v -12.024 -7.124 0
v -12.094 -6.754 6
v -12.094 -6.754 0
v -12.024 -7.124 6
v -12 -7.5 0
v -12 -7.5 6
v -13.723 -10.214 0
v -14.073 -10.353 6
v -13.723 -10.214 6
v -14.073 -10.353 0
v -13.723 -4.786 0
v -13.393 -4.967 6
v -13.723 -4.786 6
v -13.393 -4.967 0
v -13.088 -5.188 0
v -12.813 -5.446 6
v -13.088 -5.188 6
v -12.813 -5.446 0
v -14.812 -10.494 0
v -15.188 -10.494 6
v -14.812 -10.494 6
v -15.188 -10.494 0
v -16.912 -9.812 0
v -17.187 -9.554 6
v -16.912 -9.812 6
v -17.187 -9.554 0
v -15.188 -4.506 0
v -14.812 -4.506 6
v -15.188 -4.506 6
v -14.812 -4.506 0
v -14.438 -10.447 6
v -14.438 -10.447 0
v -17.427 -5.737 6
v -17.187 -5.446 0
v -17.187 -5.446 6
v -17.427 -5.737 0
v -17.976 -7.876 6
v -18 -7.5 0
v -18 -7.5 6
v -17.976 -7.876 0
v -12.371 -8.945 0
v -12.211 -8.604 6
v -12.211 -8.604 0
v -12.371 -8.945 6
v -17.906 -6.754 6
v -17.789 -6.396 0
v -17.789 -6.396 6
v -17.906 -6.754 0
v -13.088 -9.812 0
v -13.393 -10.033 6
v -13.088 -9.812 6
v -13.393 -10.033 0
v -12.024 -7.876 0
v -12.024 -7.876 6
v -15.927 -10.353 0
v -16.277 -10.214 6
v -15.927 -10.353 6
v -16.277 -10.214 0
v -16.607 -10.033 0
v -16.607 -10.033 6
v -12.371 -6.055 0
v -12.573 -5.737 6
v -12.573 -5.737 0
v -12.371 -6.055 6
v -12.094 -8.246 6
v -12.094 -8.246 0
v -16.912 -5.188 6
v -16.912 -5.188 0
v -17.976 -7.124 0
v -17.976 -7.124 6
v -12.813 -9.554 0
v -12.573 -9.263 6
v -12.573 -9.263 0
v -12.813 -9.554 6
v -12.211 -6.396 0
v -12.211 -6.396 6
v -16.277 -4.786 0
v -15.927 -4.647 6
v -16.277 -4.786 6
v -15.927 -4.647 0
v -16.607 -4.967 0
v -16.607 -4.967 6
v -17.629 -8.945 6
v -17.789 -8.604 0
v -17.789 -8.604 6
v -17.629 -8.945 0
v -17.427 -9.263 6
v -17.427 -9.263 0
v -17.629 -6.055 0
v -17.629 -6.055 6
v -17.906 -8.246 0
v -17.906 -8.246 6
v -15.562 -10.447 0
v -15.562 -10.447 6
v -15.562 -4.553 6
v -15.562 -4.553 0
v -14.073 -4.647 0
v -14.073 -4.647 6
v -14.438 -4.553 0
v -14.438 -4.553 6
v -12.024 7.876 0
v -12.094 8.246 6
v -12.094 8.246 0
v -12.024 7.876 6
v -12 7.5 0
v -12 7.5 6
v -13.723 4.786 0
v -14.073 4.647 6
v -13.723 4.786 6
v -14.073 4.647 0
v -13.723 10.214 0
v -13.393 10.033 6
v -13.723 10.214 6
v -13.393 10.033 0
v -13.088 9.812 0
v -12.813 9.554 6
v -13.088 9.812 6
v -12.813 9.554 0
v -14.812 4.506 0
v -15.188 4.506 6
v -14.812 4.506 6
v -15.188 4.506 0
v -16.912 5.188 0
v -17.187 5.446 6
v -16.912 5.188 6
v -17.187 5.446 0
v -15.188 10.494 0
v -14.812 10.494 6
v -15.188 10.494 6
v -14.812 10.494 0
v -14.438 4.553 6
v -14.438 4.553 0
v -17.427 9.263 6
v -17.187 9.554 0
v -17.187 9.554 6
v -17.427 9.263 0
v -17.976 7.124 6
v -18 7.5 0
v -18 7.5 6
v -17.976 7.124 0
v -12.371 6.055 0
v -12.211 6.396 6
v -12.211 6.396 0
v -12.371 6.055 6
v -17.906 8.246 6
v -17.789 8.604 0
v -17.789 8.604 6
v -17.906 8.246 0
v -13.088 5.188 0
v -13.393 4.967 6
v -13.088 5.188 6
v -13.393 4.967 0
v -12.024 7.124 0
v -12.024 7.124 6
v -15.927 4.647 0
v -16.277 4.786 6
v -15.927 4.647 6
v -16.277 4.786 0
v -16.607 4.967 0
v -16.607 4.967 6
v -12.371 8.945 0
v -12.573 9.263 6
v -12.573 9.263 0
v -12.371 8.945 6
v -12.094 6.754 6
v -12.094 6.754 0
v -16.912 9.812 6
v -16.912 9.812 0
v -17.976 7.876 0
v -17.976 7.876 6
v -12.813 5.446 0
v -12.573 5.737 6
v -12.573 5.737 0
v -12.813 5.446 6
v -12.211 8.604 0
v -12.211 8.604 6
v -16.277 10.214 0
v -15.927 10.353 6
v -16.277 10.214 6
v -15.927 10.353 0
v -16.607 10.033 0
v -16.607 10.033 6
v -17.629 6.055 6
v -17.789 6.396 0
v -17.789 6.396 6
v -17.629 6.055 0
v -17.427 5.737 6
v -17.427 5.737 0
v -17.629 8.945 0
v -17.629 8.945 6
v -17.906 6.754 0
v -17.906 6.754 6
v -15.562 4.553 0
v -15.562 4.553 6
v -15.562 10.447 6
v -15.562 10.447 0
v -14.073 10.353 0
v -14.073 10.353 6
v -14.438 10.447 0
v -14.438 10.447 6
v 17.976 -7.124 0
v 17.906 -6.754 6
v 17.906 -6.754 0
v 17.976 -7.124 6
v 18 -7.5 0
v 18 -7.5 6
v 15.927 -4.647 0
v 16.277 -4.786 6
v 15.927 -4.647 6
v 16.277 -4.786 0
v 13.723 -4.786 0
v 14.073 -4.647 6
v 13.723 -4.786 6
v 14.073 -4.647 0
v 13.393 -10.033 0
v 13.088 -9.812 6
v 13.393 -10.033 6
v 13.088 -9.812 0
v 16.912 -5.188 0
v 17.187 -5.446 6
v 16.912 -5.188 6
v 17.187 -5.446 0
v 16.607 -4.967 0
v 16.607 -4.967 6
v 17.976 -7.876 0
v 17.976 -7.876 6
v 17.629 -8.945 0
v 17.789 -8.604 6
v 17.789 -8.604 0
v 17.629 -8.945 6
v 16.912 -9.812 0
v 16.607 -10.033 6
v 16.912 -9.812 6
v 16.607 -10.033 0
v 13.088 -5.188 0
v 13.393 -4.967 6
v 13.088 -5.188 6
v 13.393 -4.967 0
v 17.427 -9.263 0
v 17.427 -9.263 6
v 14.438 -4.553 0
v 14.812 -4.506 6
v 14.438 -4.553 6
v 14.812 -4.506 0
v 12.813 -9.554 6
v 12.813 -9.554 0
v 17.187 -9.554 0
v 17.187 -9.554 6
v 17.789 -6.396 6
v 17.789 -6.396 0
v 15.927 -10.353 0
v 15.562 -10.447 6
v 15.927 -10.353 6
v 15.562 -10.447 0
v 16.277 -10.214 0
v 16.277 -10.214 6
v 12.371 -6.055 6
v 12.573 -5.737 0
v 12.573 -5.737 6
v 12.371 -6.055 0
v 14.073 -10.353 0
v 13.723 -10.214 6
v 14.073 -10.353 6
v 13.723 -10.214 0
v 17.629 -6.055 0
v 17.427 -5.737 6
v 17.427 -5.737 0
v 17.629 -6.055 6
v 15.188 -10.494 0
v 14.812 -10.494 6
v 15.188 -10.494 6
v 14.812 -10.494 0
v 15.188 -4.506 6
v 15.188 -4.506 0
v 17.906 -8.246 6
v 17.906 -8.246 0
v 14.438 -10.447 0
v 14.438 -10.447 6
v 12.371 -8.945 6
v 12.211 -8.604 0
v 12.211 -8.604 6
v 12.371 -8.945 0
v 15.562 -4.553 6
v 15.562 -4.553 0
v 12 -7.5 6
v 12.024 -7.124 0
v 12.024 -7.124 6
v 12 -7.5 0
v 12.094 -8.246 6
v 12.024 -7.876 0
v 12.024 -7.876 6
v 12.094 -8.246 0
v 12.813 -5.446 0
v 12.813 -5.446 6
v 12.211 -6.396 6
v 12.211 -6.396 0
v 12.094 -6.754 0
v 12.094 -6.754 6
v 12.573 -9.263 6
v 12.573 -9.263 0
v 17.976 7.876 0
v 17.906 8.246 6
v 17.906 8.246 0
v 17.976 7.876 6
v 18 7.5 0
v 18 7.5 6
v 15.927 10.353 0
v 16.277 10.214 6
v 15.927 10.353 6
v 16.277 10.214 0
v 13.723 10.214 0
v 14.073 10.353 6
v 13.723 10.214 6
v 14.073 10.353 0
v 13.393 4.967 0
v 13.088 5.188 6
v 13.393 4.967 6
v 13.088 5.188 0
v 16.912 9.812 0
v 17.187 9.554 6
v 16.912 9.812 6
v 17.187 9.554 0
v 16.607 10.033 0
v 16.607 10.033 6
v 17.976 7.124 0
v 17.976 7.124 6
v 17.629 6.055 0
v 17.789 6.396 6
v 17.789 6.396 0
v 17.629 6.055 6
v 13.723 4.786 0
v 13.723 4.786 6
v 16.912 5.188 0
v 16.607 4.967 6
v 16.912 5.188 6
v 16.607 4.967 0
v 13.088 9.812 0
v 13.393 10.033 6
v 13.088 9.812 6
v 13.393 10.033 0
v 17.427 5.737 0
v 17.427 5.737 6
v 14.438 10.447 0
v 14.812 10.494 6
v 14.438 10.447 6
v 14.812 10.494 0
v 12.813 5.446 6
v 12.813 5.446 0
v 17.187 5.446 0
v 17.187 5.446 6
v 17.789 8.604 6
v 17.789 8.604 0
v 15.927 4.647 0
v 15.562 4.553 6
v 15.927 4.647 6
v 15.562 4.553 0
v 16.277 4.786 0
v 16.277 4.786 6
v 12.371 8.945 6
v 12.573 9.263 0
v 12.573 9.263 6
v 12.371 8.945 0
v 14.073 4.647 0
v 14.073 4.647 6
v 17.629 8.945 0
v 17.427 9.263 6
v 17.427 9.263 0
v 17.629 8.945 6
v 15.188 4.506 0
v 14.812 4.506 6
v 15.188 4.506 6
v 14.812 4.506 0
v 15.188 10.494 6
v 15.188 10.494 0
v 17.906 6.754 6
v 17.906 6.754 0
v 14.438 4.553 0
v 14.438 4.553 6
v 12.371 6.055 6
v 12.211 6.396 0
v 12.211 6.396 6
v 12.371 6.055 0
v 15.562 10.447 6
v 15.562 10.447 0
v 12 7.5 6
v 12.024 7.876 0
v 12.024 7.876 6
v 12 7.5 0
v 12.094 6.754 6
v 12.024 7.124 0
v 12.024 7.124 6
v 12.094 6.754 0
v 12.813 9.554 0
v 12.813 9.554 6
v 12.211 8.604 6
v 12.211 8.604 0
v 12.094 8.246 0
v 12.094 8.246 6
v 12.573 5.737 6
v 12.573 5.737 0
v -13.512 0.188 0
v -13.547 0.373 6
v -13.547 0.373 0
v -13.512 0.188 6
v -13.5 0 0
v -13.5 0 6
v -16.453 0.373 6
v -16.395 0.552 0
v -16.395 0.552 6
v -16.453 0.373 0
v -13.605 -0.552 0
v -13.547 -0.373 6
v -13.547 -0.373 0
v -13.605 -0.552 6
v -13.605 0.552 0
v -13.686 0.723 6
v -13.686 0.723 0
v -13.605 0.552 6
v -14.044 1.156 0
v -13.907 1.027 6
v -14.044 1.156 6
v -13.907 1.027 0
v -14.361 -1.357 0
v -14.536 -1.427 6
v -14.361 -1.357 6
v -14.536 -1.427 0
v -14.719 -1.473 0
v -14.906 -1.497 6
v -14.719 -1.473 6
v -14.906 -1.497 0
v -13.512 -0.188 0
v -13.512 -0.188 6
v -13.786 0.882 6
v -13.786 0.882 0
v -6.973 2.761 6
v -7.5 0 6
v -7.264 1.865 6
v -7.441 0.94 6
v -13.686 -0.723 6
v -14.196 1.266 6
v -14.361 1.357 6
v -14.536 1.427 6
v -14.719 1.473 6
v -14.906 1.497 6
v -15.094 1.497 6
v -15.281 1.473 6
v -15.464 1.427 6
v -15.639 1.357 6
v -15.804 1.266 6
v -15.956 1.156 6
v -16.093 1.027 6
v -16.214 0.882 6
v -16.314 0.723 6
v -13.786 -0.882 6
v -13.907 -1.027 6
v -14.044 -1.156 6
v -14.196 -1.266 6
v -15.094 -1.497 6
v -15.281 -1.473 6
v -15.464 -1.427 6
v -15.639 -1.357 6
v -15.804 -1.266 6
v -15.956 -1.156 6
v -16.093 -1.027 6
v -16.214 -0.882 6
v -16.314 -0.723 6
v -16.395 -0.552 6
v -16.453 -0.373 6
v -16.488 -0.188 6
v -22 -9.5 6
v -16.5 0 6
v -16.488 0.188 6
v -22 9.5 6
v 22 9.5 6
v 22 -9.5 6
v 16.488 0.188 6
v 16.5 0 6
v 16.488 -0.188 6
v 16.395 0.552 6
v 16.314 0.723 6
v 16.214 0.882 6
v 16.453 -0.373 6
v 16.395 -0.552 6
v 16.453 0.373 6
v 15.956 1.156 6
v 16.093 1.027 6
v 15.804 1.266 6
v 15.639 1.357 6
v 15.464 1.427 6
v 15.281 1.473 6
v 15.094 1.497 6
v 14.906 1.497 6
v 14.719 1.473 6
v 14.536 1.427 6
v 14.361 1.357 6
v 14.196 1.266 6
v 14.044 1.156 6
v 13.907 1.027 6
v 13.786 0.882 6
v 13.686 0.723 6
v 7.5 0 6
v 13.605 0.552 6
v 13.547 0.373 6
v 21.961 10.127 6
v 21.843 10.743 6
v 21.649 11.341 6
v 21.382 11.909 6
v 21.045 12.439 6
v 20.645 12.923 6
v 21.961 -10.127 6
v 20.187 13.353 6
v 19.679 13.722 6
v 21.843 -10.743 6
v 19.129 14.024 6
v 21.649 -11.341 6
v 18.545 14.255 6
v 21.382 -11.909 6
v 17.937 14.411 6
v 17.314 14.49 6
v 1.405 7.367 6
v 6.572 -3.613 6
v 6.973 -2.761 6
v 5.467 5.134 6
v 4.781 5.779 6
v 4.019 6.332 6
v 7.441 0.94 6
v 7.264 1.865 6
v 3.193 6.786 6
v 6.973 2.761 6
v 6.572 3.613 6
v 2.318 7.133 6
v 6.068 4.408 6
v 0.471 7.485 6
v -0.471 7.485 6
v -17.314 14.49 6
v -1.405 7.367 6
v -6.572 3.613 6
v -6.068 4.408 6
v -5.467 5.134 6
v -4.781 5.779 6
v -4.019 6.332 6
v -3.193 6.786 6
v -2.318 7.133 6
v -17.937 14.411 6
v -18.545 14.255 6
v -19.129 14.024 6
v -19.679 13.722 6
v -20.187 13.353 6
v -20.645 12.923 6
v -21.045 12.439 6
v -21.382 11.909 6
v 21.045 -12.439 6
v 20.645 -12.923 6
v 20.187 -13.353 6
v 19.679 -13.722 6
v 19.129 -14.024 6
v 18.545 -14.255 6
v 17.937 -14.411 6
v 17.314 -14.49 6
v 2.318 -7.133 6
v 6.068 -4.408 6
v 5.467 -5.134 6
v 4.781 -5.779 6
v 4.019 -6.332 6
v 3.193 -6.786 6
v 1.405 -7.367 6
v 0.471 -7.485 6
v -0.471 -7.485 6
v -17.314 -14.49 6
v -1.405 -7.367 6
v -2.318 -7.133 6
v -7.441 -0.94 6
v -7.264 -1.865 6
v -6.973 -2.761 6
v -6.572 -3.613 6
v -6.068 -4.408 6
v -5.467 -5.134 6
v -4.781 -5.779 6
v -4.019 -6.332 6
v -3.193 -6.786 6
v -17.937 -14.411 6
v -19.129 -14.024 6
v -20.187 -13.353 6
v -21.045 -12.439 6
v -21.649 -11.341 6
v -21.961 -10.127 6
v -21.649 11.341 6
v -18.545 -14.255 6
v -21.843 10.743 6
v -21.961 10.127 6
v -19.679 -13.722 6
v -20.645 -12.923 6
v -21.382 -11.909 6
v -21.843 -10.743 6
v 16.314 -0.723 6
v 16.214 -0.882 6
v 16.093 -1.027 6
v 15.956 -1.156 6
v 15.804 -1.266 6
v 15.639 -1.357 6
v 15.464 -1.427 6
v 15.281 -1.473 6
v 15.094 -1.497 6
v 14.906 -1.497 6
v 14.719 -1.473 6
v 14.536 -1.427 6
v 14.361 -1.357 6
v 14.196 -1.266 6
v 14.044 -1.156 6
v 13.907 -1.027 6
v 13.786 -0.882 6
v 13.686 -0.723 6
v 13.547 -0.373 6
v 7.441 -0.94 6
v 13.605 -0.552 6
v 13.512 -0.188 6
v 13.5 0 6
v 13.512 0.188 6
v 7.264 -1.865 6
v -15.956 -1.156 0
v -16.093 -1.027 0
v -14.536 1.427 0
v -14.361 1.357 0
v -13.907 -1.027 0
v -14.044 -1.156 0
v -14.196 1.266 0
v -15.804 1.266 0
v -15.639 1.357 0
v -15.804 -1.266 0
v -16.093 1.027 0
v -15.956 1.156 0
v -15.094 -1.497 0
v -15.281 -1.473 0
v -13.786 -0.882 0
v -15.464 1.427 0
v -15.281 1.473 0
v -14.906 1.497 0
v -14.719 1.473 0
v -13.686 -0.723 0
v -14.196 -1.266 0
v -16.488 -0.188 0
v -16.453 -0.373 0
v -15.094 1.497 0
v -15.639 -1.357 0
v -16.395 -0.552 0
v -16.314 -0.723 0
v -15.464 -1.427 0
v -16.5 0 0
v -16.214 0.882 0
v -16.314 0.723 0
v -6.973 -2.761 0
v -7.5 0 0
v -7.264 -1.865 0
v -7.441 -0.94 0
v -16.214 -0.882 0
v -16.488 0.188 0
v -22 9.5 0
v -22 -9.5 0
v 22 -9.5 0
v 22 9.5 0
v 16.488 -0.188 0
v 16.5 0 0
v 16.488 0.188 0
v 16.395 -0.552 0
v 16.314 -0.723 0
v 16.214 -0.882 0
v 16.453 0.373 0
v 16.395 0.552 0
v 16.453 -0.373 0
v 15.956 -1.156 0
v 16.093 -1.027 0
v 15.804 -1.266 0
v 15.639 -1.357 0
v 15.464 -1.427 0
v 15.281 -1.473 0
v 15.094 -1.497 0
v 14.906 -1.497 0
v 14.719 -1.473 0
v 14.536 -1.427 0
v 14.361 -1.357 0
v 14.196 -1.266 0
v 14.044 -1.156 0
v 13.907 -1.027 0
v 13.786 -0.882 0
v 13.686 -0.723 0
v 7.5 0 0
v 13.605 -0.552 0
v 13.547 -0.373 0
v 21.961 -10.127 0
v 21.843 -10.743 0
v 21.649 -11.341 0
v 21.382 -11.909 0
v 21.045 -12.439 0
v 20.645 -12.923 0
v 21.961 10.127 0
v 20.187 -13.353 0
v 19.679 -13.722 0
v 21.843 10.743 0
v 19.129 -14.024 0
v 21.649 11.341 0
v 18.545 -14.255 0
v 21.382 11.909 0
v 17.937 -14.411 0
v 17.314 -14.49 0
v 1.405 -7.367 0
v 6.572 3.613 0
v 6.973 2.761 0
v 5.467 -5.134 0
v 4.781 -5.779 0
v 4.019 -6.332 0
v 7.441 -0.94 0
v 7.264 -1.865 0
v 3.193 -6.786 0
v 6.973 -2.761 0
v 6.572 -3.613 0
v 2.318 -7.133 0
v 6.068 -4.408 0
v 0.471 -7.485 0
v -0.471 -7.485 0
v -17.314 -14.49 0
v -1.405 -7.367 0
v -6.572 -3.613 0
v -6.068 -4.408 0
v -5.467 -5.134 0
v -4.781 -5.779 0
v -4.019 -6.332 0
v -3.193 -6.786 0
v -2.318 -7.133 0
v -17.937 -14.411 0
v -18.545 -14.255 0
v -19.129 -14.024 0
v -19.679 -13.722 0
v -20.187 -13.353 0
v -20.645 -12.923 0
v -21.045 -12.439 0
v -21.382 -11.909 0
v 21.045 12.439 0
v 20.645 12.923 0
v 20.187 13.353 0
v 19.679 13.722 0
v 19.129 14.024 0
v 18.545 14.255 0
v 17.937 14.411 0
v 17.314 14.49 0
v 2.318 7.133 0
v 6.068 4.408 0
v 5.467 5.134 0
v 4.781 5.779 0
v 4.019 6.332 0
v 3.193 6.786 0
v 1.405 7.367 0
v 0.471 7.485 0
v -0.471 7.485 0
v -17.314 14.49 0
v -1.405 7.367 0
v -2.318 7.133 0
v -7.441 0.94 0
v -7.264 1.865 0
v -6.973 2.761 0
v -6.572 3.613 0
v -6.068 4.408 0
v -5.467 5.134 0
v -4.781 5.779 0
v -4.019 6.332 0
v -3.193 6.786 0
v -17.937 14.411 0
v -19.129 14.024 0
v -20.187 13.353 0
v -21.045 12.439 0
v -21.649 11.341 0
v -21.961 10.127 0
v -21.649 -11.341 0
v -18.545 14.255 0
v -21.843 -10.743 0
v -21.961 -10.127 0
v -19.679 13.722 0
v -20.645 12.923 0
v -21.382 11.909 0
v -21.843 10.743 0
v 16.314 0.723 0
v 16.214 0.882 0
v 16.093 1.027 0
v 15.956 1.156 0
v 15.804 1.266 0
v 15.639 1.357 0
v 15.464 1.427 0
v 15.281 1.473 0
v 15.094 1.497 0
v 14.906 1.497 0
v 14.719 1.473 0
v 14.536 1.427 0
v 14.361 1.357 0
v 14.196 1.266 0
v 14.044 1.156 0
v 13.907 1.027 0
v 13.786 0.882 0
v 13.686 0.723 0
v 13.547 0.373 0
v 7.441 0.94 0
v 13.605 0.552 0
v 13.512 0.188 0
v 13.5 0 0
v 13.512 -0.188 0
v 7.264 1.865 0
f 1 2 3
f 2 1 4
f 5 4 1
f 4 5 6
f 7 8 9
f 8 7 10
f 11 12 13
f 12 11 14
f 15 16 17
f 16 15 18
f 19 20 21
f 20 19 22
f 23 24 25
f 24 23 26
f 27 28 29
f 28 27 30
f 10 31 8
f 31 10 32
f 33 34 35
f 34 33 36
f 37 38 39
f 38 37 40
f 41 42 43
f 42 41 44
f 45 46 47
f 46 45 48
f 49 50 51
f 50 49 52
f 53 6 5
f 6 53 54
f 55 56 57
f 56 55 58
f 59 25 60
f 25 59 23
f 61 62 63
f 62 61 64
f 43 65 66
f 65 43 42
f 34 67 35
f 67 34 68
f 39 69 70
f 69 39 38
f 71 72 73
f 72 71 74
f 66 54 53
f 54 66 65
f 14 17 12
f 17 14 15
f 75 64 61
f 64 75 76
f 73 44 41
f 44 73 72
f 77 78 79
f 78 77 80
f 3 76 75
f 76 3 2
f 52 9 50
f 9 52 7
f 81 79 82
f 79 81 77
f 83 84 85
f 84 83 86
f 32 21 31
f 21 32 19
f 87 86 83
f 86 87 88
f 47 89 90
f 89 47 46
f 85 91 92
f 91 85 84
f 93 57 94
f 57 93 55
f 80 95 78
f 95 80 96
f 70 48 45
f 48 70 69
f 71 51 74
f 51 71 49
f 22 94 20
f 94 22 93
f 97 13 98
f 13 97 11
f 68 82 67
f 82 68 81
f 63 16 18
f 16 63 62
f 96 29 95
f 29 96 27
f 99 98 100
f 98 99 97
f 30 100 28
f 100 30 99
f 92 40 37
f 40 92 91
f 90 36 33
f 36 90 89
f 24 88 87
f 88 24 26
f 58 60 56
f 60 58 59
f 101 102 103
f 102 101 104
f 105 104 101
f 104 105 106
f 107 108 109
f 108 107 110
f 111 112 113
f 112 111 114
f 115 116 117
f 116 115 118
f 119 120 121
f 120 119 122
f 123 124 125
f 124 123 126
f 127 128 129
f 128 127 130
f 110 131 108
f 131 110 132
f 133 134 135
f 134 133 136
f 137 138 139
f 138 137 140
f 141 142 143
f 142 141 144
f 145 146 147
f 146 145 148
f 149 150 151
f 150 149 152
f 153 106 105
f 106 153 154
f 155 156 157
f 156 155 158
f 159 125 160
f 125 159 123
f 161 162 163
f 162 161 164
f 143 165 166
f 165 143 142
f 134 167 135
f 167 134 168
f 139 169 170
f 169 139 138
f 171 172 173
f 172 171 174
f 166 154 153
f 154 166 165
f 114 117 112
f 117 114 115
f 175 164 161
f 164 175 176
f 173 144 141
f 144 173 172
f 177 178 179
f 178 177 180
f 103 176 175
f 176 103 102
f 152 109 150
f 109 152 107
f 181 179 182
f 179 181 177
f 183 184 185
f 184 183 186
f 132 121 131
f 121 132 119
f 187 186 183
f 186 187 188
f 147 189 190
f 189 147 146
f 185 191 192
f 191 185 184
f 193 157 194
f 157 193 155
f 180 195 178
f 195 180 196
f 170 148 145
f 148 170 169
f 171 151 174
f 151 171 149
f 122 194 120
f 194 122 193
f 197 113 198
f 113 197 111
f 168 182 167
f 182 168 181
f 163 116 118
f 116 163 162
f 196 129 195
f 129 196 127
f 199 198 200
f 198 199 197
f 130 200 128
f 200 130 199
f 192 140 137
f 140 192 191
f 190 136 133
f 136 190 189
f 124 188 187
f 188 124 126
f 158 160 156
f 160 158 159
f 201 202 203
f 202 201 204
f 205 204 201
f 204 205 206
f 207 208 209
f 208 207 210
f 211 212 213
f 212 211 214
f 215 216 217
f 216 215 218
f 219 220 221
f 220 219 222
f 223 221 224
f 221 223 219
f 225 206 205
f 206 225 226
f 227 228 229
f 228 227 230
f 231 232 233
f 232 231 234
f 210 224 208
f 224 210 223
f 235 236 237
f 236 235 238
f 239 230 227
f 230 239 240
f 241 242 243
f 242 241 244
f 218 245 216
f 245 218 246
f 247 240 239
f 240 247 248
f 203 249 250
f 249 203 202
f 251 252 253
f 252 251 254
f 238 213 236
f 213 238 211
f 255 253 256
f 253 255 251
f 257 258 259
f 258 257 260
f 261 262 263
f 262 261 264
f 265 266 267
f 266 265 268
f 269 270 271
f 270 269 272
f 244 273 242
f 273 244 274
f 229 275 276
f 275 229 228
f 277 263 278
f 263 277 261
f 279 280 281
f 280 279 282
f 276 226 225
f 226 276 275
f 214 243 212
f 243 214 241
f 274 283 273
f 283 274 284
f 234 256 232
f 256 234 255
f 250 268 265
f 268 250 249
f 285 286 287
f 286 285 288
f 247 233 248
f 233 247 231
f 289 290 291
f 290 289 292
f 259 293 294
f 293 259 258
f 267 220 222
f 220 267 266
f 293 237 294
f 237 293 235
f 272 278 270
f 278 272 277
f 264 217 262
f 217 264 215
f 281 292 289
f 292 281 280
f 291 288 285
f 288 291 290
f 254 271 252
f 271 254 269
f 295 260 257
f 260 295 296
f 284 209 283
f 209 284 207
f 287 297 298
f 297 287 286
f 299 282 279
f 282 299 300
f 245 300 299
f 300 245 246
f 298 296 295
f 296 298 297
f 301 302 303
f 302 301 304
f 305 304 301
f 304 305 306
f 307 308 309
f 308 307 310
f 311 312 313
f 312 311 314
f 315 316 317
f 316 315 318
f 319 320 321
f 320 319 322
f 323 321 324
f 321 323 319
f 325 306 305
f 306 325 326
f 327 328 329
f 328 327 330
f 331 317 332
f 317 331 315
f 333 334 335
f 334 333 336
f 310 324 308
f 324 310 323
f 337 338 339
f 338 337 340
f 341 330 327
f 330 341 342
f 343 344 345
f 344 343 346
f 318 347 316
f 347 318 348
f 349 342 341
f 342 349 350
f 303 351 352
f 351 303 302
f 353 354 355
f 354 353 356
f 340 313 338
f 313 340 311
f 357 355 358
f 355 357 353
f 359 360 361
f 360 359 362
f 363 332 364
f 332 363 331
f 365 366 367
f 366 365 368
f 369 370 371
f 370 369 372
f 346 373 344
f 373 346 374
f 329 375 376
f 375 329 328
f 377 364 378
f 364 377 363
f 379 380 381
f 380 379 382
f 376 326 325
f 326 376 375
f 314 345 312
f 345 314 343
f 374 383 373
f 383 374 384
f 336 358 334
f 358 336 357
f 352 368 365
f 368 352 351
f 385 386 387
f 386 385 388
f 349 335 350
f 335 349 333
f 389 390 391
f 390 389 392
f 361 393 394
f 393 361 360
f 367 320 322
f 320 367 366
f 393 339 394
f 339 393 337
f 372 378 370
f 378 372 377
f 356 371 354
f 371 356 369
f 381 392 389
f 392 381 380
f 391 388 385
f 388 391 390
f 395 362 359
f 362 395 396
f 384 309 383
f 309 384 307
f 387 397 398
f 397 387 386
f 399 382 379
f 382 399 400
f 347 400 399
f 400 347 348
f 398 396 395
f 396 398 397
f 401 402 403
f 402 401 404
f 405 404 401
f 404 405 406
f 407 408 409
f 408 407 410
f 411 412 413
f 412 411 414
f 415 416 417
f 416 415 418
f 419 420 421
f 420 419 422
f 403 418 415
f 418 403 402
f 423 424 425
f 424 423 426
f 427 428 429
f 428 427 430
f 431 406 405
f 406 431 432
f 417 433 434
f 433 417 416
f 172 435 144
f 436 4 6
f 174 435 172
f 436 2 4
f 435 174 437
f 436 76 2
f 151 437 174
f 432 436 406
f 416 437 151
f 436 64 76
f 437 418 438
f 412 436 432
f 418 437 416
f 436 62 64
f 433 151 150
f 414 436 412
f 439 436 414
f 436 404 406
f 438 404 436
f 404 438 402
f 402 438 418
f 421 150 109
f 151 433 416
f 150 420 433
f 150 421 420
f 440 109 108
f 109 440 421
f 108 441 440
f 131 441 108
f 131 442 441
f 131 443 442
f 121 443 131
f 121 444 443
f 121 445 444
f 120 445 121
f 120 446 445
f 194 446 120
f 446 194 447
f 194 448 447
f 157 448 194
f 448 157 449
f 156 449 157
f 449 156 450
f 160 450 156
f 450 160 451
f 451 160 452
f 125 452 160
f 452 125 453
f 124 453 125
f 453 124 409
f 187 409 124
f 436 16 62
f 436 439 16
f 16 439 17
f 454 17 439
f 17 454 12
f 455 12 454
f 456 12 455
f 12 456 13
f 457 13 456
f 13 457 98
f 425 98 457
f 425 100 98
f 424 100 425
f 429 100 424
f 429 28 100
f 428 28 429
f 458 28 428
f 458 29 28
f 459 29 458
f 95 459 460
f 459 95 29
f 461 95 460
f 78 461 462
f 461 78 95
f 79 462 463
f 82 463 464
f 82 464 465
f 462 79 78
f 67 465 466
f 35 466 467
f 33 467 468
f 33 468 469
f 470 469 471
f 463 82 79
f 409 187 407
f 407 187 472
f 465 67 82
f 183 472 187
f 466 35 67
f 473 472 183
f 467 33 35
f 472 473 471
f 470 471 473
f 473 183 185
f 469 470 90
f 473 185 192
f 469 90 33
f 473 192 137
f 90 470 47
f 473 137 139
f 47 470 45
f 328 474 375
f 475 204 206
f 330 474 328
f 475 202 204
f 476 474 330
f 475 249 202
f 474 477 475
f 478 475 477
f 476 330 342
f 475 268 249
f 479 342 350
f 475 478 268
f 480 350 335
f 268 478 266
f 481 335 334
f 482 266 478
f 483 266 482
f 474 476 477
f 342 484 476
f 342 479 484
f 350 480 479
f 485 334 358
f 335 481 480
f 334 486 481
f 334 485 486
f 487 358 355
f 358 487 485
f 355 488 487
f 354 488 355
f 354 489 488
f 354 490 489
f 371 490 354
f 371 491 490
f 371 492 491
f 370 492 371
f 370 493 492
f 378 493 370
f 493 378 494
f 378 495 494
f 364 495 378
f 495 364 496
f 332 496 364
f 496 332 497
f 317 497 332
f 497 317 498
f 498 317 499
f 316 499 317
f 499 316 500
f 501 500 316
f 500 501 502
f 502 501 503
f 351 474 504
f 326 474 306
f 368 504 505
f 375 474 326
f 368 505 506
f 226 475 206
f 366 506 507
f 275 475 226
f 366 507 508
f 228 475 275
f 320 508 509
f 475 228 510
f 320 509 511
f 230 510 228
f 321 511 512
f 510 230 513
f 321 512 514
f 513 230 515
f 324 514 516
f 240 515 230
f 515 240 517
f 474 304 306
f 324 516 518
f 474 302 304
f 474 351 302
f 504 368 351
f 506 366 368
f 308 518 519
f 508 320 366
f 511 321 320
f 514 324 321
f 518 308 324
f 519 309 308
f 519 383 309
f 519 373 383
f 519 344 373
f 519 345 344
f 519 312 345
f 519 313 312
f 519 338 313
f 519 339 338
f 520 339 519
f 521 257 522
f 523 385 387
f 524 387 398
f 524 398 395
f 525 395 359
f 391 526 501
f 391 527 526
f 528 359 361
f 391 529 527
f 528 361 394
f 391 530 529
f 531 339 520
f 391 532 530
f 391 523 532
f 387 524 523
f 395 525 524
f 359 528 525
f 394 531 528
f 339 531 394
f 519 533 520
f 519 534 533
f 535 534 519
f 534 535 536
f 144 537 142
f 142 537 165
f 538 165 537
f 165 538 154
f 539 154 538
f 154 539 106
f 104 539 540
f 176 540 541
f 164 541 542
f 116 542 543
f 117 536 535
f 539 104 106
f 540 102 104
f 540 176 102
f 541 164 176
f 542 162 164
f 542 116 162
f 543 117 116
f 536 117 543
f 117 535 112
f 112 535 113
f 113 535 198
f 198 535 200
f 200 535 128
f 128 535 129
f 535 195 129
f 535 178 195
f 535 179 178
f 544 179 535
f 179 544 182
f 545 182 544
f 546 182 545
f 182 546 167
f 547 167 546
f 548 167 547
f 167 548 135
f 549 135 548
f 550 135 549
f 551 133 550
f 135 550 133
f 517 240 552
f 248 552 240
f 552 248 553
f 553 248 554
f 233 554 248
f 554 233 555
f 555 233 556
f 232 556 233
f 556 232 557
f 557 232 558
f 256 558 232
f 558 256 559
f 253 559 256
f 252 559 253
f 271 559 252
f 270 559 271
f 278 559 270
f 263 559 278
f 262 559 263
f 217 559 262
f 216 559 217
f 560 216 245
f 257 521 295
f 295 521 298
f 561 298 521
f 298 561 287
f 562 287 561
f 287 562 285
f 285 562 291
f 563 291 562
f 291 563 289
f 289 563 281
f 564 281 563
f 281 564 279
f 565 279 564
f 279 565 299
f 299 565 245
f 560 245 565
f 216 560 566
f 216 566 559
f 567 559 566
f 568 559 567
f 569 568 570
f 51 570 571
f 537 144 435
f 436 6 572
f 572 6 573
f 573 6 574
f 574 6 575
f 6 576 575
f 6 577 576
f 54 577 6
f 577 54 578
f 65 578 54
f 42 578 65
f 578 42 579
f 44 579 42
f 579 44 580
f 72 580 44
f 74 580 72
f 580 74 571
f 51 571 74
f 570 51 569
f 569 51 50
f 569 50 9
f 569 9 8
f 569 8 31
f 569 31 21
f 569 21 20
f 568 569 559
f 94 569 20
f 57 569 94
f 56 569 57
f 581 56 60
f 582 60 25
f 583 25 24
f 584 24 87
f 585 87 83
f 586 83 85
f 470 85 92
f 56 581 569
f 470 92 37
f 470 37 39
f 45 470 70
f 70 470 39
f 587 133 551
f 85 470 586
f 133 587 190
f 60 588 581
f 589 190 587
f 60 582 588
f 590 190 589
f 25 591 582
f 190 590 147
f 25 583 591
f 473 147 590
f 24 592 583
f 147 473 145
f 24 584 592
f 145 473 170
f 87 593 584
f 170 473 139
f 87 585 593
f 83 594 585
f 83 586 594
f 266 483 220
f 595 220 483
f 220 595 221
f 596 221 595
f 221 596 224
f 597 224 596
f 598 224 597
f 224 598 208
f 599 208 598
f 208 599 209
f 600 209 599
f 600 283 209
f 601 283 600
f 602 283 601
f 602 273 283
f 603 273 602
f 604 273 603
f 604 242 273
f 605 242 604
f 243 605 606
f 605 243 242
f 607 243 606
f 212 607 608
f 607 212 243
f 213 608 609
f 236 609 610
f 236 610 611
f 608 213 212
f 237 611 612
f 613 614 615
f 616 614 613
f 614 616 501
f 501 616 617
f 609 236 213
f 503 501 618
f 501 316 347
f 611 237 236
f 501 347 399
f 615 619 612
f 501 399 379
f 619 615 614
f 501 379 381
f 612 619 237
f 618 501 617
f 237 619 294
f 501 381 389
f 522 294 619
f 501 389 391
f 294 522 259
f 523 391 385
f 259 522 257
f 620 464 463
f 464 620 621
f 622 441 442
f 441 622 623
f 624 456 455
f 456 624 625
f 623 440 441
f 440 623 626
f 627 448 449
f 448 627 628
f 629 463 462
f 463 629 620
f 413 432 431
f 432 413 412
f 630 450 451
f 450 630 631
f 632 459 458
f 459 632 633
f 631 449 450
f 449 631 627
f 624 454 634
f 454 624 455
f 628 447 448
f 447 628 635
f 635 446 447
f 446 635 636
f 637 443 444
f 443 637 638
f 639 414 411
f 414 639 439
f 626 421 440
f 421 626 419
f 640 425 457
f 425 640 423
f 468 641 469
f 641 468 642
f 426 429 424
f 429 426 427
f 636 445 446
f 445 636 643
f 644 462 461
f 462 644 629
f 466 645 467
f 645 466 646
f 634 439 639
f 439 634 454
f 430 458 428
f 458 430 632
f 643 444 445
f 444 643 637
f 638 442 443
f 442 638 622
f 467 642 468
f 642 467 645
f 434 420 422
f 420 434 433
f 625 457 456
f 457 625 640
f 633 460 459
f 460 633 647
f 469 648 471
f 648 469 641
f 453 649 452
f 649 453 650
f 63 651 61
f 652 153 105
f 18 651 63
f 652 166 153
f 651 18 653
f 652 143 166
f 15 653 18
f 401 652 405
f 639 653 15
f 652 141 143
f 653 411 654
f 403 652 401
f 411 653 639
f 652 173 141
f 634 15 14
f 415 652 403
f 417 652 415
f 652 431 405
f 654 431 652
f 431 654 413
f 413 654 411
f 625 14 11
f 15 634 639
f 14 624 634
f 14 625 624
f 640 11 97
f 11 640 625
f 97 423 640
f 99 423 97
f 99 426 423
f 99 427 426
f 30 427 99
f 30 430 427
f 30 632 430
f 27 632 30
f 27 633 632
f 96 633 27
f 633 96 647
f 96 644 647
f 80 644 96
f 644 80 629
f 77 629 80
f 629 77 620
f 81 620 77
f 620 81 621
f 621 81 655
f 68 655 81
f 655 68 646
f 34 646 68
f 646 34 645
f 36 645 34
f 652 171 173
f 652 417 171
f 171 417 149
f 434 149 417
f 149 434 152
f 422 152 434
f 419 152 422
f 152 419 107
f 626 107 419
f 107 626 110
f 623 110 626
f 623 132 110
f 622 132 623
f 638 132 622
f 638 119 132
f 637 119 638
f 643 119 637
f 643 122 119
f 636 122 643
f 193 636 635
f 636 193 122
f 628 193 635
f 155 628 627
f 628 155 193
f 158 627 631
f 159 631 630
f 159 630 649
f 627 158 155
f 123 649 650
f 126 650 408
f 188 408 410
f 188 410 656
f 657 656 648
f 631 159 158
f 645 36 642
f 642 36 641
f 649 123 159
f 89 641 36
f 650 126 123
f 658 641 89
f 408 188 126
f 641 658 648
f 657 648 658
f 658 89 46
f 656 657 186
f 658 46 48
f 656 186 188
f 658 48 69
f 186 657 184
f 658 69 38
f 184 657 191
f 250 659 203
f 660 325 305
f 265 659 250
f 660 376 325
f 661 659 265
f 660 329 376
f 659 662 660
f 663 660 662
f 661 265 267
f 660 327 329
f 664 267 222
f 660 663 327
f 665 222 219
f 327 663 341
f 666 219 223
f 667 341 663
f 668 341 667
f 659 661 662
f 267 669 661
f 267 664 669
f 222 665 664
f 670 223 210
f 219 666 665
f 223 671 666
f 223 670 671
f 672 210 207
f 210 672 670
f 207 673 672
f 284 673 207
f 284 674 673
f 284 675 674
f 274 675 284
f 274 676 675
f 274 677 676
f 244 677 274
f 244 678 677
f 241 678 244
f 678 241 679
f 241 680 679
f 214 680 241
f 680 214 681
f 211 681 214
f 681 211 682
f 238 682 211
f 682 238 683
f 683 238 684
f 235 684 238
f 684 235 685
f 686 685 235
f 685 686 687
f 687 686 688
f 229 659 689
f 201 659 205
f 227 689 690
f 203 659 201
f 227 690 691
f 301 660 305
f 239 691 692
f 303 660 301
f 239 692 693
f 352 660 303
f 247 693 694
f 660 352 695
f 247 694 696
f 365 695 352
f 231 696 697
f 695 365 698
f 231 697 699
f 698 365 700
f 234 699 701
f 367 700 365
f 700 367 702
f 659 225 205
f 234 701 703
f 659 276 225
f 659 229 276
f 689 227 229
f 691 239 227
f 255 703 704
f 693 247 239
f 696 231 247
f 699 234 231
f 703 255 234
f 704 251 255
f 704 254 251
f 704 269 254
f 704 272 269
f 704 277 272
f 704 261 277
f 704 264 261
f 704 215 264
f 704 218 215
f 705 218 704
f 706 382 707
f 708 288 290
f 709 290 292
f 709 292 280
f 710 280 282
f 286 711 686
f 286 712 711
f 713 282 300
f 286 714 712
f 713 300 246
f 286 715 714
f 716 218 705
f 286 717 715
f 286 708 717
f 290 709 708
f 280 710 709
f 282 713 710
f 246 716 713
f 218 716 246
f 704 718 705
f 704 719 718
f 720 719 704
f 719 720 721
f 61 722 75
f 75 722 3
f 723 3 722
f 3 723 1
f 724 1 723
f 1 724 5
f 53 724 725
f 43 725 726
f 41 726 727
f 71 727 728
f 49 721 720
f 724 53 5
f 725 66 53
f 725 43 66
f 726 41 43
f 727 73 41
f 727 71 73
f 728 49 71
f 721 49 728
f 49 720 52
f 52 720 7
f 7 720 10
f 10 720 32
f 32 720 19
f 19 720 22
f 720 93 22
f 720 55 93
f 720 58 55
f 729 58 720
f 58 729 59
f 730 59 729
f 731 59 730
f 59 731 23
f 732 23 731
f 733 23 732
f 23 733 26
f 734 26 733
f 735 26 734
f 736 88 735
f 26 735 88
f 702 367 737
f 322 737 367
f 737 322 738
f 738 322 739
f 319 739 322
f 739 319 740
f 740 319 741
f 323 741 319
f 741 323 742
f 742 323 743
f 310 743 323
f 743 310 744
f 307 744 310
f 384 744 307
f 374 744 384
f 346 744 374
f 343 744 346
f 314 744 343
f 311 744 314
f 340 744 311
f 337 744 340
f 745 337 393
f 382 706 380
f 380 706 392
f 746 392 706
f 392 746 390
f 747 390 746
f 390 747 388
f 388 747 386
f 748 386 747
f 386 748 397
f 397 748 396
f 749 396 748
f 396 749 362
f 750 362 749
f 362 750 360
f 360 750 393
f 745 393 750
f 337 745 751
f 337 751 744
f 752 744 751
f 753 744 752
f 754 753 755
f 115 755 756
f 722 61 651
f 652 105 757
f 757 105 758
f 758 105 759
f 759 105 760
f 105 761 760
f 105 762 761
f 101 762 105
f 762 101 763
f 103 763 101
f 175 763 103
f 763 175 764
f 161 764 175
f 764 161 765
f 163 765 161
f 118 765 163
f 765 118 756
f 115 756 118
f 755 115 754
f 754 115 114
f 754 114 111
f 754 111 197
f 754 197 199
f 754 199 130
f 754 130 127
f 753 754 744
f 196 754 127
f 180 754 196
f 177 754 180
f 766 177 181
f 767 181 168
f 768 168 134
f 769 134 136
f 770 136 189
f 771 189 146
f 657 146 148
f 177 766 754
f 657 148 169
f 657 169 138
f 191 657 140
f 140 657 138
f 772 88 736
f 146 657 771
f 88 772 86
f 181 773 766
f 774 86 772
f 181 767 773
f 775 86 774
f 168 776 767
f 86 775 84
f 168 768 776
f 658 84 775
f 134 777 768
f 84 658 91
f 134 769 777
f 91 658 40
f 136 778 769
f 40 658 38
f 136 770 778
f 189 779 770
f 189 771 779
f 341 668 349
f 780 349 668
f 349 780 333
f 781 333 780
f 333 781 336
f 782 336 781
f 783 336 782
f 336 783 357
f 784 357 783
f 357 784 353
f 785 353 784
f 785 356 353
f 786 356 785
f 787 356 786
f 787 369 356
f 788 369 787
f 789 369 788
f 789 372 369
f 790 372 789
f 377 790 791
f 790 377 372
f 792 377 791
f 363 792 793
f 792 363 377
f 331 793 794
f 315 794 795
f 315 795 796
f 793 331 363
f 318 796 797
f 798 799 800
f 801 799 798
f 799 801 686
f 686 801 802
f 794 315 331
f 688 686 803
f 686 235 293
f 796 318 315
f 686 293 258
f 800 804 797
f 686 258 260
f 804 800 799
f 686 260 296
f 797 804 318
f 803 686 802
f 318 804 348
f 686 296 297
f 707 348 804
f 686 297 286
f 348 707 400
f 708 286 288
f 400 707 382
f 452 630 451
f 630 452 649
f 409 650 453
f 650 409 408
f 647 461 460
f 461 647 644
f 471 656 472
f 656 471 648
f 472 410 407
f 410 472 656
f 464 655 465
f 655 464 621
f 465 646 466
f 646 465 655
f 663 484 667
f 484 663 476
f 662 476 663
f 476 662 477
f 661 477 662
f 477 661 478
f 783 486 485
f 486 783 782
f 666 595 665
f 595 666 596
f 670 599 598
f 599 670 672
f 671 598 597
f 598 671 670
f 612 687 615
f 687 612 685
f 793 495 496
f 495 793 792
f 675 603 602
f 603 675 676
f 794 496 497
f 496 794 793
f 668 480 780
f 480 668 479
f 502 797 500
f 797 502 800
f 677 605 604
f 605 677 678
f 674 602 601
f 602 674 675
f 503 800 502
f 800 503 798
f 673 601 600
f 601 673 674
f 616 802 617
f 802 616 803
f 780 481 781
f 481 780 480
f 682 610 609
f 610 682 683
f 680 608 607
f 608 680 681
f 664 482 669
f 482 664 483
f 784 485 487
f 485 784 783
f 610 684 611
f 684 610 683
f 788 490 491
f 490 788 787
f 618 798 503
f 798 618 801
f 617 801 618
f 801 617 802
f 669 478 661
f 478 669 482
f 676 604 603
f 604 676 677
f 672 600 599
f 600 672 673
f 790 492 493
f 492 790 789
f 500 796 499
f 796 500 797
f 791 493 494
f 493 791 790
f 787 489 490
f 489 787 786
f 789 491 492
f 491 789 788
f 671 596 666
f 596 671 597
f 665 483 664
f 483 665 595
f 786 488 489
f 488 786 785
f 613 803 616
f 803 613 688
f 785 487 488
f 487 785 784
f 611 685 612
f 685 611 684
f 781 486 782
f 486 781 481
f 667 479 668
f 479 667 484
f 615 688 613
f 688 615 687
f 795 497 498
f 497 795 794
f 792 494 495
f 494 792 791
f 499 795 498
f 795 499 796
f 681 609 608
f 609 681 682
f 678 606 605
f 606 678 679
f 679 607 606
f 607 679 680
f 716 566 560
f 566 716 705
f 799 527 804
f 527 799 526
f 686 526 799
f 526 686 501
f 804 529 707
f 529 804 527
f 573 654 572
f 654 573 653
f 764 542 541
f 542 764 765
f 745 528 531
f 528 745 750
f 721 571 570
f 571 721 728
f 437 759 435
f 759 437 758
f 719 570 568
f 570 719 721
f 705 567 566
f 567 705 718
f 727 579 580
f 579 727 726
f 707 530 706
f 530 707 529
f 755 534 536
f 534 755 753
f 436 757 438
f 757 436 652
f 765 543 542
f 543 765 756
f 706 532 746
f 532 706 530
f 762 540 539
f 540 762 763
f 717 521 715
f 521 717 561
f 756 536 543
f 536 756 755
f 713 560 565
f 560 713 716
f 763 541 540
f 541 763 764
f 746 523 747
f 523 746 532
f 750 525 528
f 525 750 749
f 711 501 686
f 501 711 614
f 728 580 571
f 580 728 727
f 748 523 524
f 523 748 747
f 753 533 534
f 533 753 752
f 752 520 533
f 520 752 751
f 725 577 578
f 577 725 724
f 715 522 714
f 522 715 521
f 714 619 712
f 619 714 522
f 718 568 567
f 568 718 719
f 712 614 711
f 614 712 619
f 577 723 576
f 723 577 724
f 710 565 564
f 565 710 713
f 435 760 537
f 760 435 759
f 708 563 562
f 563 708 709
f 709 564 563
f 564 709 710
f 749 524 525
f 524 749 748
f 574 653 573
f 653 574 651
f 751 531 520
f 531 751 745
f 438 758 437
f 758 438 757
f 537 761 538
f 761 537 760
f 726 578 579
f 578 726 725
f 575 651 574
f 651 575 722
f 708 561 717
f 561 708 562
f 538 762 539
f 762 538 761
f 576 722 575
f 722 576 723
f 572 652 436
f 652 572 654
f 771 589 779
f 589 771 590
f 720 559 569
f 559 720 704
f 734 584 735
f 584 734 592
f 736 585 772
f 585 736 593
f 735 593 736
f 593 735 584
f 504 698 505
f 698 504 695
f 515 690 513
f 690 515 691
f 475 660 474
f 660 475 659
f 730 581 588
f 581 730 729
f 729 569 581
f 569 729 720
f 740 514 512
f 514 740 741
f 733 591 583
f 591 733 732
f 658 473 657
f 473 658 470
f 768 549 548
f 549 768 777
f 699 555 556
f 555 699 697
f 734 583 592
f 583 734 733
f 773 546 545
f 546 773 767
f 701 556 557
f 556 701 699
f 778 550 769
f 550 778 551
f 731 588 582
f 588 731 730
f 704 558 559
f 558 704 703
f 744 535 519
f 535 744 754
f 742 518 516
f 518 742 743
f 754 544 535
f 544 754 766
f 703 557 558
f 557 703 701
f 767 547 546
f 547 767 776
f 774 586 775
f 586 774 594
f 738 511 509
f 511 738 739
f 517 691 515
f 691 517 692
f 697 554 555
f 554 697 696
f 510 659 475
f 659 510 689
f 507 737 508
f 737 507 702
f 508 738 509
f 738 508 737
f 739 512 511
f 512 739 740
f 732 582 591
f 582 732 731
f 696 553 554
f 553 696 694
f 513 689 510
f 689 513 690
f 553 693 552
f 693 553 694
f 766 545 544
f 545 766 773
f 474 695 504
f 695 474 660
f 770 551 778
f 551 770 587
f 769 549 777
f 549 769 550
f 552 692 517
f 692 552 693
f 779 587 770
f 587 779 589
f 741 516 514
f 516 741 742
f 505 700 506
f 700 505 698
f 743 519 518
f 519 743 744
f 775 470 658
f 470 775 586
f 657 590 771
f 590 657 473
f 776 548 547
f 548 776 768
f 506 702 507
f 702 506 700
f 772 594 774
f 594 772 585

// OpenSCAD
$fn = 50;


difference() {
	union() {
		hull() {
			translate(v = [-17.0000000000, 9.5000000000, 0]) {
				cylinder(h = 6, r = 5);
			}
			translate(v = [17.0000000000, 9.5000000000, 0]) {
				cylinder(h = 6, r = 5);
			}
			translate(v = [-17.0000000000, -9.5000000000, 0]) {
				cylinder(h = 6, r = 5);
			}
			translate(v = [17.0000000000, -9.5000000000, 0]) {
				cylinder(h = 6, r = 5);
			}
		}
	}
	union() {
		#translate(v = [-15.0000000000, -7.5000000000, 0]) {
			cylinder(h = 6, r = 3.0000000000);
		}
		#translate(v = [-15.0000000000, 7.5000000000, 0]) {
			cylinder(h = 6, r = 3.0000000000);
		}
		#translate(v = [15.0000000000, -7.5000000000, 0]) {
			cylinder(h = 6, r = 3.0000000000);
		}
		#translate(v = [15.0000000000, 7.5000000000, 0]) {
			cylinder(h = 6, r = 3.0000000000);
		}
		#translate(v = [-15.0000000000, -7.5000000000, -100.0000000000]) {
			cylinder(h = 200, r = 3.0000000000);
		}
		#translate(v = [-15.0000000000, 7.5000000000, -100.0000000000]) {
			cylinder(h = 200, r = 3.0000000000);
		}
		#translate(v = [15.0000000000, -7.5000000000, -100.0000000000]) {
			cylinder(h = 200, r = 3.0000000000);
		}
		#translate(v = [15.0000000000, 7.5000000000, -100.0000000000]) {
			cylinder(h = 200, r = 3.0000000000);
		}
		#translate(v = [-15.0000000000, -7.5000000000, 0]) {
			cylinder(h = 6, r = 1.5000000000);
		}
		#translate(v = [-15.0000000000, 0.0000000000, 0]) {
			cylinder(h = 6, r = 1.5000000000);
		}
		#translate(v = [-15.0000000000, 7.5000000000, 0]) {
			cylinder(h = 6, r = 1.5000000000);
		}
		#translate(v = [15.0000000000, -7.5000000000, 0]) {
			cylinder(h = 6, r = 1.5000000000);
		}
		#translate(v = [15.0000000000, 0.0000000000, 0]) {
			cylinder(h = 6, r = 1.5000000000);
		}
		#translate(v = [15.0000000000, 7.5000000000, 0]) {
			cylinder(h = 6, r = 1.5000000000);
		}
		#translate(v = [-15.0000000000, -7.5000000000, 0]) {
			cylinder(h = 6, r = 1.5000000000);
		}
		#translate(v = [-15.0000000000, 0.0000000000, 0]) {
			cylinder(h = 6, r = 1.5000000000);
		}
		#translate(v = [-15.0000000000, 7.5000000000, 0]) {
			cylinder(h = 6, r = 1.5000000000);
		}
		#translate(v = [15.0000000000, -7.5000000000, 0]) {
			cylinder(h = 6, r = 1.5000000000);
		}
		#translate(v = [15.0000000000, 0.0000000000, 0]) {
			cylinder(h = 6, r = 1.5000000000);
		}
		#translate(v = [15.0000000000, 7.5000000000, 0]) {
			cylinder(h = 6, r = 1.5000000000);
		}
		#translate(v = [-15.0000000000, -7.5000000000, 0]) {
			cylinder(h = 6, r = 1.5000000000);
		}
		#translate(v = [-15.0000000000, 0.0000000000, 0]) {
			cylinder(h = 6, r = 1.5000000000);
		}
		#translate(v = [-15.0000000000, 7.5000000000, 0]) {
			cylinder(h = 6, r = 1.5000000000);
		}
		#translate(v = [15.0000000000, -7.5000000000, 0]) {
			cylinder(h = 6, r = 1.5000000000);
		}
		#translate(v = [15.0000000000, 0.0000000000, 0]) {
			cylinder(h = 6, r = 1.5000000000);
		}
		#translate(v = [15.0000000000, 7.5000000000, 0]) {
			cylinder(h = 6, r = 1.5000000000);
		}
		#cylinder(h = 6, r = 7.5000000000);
	}
}
